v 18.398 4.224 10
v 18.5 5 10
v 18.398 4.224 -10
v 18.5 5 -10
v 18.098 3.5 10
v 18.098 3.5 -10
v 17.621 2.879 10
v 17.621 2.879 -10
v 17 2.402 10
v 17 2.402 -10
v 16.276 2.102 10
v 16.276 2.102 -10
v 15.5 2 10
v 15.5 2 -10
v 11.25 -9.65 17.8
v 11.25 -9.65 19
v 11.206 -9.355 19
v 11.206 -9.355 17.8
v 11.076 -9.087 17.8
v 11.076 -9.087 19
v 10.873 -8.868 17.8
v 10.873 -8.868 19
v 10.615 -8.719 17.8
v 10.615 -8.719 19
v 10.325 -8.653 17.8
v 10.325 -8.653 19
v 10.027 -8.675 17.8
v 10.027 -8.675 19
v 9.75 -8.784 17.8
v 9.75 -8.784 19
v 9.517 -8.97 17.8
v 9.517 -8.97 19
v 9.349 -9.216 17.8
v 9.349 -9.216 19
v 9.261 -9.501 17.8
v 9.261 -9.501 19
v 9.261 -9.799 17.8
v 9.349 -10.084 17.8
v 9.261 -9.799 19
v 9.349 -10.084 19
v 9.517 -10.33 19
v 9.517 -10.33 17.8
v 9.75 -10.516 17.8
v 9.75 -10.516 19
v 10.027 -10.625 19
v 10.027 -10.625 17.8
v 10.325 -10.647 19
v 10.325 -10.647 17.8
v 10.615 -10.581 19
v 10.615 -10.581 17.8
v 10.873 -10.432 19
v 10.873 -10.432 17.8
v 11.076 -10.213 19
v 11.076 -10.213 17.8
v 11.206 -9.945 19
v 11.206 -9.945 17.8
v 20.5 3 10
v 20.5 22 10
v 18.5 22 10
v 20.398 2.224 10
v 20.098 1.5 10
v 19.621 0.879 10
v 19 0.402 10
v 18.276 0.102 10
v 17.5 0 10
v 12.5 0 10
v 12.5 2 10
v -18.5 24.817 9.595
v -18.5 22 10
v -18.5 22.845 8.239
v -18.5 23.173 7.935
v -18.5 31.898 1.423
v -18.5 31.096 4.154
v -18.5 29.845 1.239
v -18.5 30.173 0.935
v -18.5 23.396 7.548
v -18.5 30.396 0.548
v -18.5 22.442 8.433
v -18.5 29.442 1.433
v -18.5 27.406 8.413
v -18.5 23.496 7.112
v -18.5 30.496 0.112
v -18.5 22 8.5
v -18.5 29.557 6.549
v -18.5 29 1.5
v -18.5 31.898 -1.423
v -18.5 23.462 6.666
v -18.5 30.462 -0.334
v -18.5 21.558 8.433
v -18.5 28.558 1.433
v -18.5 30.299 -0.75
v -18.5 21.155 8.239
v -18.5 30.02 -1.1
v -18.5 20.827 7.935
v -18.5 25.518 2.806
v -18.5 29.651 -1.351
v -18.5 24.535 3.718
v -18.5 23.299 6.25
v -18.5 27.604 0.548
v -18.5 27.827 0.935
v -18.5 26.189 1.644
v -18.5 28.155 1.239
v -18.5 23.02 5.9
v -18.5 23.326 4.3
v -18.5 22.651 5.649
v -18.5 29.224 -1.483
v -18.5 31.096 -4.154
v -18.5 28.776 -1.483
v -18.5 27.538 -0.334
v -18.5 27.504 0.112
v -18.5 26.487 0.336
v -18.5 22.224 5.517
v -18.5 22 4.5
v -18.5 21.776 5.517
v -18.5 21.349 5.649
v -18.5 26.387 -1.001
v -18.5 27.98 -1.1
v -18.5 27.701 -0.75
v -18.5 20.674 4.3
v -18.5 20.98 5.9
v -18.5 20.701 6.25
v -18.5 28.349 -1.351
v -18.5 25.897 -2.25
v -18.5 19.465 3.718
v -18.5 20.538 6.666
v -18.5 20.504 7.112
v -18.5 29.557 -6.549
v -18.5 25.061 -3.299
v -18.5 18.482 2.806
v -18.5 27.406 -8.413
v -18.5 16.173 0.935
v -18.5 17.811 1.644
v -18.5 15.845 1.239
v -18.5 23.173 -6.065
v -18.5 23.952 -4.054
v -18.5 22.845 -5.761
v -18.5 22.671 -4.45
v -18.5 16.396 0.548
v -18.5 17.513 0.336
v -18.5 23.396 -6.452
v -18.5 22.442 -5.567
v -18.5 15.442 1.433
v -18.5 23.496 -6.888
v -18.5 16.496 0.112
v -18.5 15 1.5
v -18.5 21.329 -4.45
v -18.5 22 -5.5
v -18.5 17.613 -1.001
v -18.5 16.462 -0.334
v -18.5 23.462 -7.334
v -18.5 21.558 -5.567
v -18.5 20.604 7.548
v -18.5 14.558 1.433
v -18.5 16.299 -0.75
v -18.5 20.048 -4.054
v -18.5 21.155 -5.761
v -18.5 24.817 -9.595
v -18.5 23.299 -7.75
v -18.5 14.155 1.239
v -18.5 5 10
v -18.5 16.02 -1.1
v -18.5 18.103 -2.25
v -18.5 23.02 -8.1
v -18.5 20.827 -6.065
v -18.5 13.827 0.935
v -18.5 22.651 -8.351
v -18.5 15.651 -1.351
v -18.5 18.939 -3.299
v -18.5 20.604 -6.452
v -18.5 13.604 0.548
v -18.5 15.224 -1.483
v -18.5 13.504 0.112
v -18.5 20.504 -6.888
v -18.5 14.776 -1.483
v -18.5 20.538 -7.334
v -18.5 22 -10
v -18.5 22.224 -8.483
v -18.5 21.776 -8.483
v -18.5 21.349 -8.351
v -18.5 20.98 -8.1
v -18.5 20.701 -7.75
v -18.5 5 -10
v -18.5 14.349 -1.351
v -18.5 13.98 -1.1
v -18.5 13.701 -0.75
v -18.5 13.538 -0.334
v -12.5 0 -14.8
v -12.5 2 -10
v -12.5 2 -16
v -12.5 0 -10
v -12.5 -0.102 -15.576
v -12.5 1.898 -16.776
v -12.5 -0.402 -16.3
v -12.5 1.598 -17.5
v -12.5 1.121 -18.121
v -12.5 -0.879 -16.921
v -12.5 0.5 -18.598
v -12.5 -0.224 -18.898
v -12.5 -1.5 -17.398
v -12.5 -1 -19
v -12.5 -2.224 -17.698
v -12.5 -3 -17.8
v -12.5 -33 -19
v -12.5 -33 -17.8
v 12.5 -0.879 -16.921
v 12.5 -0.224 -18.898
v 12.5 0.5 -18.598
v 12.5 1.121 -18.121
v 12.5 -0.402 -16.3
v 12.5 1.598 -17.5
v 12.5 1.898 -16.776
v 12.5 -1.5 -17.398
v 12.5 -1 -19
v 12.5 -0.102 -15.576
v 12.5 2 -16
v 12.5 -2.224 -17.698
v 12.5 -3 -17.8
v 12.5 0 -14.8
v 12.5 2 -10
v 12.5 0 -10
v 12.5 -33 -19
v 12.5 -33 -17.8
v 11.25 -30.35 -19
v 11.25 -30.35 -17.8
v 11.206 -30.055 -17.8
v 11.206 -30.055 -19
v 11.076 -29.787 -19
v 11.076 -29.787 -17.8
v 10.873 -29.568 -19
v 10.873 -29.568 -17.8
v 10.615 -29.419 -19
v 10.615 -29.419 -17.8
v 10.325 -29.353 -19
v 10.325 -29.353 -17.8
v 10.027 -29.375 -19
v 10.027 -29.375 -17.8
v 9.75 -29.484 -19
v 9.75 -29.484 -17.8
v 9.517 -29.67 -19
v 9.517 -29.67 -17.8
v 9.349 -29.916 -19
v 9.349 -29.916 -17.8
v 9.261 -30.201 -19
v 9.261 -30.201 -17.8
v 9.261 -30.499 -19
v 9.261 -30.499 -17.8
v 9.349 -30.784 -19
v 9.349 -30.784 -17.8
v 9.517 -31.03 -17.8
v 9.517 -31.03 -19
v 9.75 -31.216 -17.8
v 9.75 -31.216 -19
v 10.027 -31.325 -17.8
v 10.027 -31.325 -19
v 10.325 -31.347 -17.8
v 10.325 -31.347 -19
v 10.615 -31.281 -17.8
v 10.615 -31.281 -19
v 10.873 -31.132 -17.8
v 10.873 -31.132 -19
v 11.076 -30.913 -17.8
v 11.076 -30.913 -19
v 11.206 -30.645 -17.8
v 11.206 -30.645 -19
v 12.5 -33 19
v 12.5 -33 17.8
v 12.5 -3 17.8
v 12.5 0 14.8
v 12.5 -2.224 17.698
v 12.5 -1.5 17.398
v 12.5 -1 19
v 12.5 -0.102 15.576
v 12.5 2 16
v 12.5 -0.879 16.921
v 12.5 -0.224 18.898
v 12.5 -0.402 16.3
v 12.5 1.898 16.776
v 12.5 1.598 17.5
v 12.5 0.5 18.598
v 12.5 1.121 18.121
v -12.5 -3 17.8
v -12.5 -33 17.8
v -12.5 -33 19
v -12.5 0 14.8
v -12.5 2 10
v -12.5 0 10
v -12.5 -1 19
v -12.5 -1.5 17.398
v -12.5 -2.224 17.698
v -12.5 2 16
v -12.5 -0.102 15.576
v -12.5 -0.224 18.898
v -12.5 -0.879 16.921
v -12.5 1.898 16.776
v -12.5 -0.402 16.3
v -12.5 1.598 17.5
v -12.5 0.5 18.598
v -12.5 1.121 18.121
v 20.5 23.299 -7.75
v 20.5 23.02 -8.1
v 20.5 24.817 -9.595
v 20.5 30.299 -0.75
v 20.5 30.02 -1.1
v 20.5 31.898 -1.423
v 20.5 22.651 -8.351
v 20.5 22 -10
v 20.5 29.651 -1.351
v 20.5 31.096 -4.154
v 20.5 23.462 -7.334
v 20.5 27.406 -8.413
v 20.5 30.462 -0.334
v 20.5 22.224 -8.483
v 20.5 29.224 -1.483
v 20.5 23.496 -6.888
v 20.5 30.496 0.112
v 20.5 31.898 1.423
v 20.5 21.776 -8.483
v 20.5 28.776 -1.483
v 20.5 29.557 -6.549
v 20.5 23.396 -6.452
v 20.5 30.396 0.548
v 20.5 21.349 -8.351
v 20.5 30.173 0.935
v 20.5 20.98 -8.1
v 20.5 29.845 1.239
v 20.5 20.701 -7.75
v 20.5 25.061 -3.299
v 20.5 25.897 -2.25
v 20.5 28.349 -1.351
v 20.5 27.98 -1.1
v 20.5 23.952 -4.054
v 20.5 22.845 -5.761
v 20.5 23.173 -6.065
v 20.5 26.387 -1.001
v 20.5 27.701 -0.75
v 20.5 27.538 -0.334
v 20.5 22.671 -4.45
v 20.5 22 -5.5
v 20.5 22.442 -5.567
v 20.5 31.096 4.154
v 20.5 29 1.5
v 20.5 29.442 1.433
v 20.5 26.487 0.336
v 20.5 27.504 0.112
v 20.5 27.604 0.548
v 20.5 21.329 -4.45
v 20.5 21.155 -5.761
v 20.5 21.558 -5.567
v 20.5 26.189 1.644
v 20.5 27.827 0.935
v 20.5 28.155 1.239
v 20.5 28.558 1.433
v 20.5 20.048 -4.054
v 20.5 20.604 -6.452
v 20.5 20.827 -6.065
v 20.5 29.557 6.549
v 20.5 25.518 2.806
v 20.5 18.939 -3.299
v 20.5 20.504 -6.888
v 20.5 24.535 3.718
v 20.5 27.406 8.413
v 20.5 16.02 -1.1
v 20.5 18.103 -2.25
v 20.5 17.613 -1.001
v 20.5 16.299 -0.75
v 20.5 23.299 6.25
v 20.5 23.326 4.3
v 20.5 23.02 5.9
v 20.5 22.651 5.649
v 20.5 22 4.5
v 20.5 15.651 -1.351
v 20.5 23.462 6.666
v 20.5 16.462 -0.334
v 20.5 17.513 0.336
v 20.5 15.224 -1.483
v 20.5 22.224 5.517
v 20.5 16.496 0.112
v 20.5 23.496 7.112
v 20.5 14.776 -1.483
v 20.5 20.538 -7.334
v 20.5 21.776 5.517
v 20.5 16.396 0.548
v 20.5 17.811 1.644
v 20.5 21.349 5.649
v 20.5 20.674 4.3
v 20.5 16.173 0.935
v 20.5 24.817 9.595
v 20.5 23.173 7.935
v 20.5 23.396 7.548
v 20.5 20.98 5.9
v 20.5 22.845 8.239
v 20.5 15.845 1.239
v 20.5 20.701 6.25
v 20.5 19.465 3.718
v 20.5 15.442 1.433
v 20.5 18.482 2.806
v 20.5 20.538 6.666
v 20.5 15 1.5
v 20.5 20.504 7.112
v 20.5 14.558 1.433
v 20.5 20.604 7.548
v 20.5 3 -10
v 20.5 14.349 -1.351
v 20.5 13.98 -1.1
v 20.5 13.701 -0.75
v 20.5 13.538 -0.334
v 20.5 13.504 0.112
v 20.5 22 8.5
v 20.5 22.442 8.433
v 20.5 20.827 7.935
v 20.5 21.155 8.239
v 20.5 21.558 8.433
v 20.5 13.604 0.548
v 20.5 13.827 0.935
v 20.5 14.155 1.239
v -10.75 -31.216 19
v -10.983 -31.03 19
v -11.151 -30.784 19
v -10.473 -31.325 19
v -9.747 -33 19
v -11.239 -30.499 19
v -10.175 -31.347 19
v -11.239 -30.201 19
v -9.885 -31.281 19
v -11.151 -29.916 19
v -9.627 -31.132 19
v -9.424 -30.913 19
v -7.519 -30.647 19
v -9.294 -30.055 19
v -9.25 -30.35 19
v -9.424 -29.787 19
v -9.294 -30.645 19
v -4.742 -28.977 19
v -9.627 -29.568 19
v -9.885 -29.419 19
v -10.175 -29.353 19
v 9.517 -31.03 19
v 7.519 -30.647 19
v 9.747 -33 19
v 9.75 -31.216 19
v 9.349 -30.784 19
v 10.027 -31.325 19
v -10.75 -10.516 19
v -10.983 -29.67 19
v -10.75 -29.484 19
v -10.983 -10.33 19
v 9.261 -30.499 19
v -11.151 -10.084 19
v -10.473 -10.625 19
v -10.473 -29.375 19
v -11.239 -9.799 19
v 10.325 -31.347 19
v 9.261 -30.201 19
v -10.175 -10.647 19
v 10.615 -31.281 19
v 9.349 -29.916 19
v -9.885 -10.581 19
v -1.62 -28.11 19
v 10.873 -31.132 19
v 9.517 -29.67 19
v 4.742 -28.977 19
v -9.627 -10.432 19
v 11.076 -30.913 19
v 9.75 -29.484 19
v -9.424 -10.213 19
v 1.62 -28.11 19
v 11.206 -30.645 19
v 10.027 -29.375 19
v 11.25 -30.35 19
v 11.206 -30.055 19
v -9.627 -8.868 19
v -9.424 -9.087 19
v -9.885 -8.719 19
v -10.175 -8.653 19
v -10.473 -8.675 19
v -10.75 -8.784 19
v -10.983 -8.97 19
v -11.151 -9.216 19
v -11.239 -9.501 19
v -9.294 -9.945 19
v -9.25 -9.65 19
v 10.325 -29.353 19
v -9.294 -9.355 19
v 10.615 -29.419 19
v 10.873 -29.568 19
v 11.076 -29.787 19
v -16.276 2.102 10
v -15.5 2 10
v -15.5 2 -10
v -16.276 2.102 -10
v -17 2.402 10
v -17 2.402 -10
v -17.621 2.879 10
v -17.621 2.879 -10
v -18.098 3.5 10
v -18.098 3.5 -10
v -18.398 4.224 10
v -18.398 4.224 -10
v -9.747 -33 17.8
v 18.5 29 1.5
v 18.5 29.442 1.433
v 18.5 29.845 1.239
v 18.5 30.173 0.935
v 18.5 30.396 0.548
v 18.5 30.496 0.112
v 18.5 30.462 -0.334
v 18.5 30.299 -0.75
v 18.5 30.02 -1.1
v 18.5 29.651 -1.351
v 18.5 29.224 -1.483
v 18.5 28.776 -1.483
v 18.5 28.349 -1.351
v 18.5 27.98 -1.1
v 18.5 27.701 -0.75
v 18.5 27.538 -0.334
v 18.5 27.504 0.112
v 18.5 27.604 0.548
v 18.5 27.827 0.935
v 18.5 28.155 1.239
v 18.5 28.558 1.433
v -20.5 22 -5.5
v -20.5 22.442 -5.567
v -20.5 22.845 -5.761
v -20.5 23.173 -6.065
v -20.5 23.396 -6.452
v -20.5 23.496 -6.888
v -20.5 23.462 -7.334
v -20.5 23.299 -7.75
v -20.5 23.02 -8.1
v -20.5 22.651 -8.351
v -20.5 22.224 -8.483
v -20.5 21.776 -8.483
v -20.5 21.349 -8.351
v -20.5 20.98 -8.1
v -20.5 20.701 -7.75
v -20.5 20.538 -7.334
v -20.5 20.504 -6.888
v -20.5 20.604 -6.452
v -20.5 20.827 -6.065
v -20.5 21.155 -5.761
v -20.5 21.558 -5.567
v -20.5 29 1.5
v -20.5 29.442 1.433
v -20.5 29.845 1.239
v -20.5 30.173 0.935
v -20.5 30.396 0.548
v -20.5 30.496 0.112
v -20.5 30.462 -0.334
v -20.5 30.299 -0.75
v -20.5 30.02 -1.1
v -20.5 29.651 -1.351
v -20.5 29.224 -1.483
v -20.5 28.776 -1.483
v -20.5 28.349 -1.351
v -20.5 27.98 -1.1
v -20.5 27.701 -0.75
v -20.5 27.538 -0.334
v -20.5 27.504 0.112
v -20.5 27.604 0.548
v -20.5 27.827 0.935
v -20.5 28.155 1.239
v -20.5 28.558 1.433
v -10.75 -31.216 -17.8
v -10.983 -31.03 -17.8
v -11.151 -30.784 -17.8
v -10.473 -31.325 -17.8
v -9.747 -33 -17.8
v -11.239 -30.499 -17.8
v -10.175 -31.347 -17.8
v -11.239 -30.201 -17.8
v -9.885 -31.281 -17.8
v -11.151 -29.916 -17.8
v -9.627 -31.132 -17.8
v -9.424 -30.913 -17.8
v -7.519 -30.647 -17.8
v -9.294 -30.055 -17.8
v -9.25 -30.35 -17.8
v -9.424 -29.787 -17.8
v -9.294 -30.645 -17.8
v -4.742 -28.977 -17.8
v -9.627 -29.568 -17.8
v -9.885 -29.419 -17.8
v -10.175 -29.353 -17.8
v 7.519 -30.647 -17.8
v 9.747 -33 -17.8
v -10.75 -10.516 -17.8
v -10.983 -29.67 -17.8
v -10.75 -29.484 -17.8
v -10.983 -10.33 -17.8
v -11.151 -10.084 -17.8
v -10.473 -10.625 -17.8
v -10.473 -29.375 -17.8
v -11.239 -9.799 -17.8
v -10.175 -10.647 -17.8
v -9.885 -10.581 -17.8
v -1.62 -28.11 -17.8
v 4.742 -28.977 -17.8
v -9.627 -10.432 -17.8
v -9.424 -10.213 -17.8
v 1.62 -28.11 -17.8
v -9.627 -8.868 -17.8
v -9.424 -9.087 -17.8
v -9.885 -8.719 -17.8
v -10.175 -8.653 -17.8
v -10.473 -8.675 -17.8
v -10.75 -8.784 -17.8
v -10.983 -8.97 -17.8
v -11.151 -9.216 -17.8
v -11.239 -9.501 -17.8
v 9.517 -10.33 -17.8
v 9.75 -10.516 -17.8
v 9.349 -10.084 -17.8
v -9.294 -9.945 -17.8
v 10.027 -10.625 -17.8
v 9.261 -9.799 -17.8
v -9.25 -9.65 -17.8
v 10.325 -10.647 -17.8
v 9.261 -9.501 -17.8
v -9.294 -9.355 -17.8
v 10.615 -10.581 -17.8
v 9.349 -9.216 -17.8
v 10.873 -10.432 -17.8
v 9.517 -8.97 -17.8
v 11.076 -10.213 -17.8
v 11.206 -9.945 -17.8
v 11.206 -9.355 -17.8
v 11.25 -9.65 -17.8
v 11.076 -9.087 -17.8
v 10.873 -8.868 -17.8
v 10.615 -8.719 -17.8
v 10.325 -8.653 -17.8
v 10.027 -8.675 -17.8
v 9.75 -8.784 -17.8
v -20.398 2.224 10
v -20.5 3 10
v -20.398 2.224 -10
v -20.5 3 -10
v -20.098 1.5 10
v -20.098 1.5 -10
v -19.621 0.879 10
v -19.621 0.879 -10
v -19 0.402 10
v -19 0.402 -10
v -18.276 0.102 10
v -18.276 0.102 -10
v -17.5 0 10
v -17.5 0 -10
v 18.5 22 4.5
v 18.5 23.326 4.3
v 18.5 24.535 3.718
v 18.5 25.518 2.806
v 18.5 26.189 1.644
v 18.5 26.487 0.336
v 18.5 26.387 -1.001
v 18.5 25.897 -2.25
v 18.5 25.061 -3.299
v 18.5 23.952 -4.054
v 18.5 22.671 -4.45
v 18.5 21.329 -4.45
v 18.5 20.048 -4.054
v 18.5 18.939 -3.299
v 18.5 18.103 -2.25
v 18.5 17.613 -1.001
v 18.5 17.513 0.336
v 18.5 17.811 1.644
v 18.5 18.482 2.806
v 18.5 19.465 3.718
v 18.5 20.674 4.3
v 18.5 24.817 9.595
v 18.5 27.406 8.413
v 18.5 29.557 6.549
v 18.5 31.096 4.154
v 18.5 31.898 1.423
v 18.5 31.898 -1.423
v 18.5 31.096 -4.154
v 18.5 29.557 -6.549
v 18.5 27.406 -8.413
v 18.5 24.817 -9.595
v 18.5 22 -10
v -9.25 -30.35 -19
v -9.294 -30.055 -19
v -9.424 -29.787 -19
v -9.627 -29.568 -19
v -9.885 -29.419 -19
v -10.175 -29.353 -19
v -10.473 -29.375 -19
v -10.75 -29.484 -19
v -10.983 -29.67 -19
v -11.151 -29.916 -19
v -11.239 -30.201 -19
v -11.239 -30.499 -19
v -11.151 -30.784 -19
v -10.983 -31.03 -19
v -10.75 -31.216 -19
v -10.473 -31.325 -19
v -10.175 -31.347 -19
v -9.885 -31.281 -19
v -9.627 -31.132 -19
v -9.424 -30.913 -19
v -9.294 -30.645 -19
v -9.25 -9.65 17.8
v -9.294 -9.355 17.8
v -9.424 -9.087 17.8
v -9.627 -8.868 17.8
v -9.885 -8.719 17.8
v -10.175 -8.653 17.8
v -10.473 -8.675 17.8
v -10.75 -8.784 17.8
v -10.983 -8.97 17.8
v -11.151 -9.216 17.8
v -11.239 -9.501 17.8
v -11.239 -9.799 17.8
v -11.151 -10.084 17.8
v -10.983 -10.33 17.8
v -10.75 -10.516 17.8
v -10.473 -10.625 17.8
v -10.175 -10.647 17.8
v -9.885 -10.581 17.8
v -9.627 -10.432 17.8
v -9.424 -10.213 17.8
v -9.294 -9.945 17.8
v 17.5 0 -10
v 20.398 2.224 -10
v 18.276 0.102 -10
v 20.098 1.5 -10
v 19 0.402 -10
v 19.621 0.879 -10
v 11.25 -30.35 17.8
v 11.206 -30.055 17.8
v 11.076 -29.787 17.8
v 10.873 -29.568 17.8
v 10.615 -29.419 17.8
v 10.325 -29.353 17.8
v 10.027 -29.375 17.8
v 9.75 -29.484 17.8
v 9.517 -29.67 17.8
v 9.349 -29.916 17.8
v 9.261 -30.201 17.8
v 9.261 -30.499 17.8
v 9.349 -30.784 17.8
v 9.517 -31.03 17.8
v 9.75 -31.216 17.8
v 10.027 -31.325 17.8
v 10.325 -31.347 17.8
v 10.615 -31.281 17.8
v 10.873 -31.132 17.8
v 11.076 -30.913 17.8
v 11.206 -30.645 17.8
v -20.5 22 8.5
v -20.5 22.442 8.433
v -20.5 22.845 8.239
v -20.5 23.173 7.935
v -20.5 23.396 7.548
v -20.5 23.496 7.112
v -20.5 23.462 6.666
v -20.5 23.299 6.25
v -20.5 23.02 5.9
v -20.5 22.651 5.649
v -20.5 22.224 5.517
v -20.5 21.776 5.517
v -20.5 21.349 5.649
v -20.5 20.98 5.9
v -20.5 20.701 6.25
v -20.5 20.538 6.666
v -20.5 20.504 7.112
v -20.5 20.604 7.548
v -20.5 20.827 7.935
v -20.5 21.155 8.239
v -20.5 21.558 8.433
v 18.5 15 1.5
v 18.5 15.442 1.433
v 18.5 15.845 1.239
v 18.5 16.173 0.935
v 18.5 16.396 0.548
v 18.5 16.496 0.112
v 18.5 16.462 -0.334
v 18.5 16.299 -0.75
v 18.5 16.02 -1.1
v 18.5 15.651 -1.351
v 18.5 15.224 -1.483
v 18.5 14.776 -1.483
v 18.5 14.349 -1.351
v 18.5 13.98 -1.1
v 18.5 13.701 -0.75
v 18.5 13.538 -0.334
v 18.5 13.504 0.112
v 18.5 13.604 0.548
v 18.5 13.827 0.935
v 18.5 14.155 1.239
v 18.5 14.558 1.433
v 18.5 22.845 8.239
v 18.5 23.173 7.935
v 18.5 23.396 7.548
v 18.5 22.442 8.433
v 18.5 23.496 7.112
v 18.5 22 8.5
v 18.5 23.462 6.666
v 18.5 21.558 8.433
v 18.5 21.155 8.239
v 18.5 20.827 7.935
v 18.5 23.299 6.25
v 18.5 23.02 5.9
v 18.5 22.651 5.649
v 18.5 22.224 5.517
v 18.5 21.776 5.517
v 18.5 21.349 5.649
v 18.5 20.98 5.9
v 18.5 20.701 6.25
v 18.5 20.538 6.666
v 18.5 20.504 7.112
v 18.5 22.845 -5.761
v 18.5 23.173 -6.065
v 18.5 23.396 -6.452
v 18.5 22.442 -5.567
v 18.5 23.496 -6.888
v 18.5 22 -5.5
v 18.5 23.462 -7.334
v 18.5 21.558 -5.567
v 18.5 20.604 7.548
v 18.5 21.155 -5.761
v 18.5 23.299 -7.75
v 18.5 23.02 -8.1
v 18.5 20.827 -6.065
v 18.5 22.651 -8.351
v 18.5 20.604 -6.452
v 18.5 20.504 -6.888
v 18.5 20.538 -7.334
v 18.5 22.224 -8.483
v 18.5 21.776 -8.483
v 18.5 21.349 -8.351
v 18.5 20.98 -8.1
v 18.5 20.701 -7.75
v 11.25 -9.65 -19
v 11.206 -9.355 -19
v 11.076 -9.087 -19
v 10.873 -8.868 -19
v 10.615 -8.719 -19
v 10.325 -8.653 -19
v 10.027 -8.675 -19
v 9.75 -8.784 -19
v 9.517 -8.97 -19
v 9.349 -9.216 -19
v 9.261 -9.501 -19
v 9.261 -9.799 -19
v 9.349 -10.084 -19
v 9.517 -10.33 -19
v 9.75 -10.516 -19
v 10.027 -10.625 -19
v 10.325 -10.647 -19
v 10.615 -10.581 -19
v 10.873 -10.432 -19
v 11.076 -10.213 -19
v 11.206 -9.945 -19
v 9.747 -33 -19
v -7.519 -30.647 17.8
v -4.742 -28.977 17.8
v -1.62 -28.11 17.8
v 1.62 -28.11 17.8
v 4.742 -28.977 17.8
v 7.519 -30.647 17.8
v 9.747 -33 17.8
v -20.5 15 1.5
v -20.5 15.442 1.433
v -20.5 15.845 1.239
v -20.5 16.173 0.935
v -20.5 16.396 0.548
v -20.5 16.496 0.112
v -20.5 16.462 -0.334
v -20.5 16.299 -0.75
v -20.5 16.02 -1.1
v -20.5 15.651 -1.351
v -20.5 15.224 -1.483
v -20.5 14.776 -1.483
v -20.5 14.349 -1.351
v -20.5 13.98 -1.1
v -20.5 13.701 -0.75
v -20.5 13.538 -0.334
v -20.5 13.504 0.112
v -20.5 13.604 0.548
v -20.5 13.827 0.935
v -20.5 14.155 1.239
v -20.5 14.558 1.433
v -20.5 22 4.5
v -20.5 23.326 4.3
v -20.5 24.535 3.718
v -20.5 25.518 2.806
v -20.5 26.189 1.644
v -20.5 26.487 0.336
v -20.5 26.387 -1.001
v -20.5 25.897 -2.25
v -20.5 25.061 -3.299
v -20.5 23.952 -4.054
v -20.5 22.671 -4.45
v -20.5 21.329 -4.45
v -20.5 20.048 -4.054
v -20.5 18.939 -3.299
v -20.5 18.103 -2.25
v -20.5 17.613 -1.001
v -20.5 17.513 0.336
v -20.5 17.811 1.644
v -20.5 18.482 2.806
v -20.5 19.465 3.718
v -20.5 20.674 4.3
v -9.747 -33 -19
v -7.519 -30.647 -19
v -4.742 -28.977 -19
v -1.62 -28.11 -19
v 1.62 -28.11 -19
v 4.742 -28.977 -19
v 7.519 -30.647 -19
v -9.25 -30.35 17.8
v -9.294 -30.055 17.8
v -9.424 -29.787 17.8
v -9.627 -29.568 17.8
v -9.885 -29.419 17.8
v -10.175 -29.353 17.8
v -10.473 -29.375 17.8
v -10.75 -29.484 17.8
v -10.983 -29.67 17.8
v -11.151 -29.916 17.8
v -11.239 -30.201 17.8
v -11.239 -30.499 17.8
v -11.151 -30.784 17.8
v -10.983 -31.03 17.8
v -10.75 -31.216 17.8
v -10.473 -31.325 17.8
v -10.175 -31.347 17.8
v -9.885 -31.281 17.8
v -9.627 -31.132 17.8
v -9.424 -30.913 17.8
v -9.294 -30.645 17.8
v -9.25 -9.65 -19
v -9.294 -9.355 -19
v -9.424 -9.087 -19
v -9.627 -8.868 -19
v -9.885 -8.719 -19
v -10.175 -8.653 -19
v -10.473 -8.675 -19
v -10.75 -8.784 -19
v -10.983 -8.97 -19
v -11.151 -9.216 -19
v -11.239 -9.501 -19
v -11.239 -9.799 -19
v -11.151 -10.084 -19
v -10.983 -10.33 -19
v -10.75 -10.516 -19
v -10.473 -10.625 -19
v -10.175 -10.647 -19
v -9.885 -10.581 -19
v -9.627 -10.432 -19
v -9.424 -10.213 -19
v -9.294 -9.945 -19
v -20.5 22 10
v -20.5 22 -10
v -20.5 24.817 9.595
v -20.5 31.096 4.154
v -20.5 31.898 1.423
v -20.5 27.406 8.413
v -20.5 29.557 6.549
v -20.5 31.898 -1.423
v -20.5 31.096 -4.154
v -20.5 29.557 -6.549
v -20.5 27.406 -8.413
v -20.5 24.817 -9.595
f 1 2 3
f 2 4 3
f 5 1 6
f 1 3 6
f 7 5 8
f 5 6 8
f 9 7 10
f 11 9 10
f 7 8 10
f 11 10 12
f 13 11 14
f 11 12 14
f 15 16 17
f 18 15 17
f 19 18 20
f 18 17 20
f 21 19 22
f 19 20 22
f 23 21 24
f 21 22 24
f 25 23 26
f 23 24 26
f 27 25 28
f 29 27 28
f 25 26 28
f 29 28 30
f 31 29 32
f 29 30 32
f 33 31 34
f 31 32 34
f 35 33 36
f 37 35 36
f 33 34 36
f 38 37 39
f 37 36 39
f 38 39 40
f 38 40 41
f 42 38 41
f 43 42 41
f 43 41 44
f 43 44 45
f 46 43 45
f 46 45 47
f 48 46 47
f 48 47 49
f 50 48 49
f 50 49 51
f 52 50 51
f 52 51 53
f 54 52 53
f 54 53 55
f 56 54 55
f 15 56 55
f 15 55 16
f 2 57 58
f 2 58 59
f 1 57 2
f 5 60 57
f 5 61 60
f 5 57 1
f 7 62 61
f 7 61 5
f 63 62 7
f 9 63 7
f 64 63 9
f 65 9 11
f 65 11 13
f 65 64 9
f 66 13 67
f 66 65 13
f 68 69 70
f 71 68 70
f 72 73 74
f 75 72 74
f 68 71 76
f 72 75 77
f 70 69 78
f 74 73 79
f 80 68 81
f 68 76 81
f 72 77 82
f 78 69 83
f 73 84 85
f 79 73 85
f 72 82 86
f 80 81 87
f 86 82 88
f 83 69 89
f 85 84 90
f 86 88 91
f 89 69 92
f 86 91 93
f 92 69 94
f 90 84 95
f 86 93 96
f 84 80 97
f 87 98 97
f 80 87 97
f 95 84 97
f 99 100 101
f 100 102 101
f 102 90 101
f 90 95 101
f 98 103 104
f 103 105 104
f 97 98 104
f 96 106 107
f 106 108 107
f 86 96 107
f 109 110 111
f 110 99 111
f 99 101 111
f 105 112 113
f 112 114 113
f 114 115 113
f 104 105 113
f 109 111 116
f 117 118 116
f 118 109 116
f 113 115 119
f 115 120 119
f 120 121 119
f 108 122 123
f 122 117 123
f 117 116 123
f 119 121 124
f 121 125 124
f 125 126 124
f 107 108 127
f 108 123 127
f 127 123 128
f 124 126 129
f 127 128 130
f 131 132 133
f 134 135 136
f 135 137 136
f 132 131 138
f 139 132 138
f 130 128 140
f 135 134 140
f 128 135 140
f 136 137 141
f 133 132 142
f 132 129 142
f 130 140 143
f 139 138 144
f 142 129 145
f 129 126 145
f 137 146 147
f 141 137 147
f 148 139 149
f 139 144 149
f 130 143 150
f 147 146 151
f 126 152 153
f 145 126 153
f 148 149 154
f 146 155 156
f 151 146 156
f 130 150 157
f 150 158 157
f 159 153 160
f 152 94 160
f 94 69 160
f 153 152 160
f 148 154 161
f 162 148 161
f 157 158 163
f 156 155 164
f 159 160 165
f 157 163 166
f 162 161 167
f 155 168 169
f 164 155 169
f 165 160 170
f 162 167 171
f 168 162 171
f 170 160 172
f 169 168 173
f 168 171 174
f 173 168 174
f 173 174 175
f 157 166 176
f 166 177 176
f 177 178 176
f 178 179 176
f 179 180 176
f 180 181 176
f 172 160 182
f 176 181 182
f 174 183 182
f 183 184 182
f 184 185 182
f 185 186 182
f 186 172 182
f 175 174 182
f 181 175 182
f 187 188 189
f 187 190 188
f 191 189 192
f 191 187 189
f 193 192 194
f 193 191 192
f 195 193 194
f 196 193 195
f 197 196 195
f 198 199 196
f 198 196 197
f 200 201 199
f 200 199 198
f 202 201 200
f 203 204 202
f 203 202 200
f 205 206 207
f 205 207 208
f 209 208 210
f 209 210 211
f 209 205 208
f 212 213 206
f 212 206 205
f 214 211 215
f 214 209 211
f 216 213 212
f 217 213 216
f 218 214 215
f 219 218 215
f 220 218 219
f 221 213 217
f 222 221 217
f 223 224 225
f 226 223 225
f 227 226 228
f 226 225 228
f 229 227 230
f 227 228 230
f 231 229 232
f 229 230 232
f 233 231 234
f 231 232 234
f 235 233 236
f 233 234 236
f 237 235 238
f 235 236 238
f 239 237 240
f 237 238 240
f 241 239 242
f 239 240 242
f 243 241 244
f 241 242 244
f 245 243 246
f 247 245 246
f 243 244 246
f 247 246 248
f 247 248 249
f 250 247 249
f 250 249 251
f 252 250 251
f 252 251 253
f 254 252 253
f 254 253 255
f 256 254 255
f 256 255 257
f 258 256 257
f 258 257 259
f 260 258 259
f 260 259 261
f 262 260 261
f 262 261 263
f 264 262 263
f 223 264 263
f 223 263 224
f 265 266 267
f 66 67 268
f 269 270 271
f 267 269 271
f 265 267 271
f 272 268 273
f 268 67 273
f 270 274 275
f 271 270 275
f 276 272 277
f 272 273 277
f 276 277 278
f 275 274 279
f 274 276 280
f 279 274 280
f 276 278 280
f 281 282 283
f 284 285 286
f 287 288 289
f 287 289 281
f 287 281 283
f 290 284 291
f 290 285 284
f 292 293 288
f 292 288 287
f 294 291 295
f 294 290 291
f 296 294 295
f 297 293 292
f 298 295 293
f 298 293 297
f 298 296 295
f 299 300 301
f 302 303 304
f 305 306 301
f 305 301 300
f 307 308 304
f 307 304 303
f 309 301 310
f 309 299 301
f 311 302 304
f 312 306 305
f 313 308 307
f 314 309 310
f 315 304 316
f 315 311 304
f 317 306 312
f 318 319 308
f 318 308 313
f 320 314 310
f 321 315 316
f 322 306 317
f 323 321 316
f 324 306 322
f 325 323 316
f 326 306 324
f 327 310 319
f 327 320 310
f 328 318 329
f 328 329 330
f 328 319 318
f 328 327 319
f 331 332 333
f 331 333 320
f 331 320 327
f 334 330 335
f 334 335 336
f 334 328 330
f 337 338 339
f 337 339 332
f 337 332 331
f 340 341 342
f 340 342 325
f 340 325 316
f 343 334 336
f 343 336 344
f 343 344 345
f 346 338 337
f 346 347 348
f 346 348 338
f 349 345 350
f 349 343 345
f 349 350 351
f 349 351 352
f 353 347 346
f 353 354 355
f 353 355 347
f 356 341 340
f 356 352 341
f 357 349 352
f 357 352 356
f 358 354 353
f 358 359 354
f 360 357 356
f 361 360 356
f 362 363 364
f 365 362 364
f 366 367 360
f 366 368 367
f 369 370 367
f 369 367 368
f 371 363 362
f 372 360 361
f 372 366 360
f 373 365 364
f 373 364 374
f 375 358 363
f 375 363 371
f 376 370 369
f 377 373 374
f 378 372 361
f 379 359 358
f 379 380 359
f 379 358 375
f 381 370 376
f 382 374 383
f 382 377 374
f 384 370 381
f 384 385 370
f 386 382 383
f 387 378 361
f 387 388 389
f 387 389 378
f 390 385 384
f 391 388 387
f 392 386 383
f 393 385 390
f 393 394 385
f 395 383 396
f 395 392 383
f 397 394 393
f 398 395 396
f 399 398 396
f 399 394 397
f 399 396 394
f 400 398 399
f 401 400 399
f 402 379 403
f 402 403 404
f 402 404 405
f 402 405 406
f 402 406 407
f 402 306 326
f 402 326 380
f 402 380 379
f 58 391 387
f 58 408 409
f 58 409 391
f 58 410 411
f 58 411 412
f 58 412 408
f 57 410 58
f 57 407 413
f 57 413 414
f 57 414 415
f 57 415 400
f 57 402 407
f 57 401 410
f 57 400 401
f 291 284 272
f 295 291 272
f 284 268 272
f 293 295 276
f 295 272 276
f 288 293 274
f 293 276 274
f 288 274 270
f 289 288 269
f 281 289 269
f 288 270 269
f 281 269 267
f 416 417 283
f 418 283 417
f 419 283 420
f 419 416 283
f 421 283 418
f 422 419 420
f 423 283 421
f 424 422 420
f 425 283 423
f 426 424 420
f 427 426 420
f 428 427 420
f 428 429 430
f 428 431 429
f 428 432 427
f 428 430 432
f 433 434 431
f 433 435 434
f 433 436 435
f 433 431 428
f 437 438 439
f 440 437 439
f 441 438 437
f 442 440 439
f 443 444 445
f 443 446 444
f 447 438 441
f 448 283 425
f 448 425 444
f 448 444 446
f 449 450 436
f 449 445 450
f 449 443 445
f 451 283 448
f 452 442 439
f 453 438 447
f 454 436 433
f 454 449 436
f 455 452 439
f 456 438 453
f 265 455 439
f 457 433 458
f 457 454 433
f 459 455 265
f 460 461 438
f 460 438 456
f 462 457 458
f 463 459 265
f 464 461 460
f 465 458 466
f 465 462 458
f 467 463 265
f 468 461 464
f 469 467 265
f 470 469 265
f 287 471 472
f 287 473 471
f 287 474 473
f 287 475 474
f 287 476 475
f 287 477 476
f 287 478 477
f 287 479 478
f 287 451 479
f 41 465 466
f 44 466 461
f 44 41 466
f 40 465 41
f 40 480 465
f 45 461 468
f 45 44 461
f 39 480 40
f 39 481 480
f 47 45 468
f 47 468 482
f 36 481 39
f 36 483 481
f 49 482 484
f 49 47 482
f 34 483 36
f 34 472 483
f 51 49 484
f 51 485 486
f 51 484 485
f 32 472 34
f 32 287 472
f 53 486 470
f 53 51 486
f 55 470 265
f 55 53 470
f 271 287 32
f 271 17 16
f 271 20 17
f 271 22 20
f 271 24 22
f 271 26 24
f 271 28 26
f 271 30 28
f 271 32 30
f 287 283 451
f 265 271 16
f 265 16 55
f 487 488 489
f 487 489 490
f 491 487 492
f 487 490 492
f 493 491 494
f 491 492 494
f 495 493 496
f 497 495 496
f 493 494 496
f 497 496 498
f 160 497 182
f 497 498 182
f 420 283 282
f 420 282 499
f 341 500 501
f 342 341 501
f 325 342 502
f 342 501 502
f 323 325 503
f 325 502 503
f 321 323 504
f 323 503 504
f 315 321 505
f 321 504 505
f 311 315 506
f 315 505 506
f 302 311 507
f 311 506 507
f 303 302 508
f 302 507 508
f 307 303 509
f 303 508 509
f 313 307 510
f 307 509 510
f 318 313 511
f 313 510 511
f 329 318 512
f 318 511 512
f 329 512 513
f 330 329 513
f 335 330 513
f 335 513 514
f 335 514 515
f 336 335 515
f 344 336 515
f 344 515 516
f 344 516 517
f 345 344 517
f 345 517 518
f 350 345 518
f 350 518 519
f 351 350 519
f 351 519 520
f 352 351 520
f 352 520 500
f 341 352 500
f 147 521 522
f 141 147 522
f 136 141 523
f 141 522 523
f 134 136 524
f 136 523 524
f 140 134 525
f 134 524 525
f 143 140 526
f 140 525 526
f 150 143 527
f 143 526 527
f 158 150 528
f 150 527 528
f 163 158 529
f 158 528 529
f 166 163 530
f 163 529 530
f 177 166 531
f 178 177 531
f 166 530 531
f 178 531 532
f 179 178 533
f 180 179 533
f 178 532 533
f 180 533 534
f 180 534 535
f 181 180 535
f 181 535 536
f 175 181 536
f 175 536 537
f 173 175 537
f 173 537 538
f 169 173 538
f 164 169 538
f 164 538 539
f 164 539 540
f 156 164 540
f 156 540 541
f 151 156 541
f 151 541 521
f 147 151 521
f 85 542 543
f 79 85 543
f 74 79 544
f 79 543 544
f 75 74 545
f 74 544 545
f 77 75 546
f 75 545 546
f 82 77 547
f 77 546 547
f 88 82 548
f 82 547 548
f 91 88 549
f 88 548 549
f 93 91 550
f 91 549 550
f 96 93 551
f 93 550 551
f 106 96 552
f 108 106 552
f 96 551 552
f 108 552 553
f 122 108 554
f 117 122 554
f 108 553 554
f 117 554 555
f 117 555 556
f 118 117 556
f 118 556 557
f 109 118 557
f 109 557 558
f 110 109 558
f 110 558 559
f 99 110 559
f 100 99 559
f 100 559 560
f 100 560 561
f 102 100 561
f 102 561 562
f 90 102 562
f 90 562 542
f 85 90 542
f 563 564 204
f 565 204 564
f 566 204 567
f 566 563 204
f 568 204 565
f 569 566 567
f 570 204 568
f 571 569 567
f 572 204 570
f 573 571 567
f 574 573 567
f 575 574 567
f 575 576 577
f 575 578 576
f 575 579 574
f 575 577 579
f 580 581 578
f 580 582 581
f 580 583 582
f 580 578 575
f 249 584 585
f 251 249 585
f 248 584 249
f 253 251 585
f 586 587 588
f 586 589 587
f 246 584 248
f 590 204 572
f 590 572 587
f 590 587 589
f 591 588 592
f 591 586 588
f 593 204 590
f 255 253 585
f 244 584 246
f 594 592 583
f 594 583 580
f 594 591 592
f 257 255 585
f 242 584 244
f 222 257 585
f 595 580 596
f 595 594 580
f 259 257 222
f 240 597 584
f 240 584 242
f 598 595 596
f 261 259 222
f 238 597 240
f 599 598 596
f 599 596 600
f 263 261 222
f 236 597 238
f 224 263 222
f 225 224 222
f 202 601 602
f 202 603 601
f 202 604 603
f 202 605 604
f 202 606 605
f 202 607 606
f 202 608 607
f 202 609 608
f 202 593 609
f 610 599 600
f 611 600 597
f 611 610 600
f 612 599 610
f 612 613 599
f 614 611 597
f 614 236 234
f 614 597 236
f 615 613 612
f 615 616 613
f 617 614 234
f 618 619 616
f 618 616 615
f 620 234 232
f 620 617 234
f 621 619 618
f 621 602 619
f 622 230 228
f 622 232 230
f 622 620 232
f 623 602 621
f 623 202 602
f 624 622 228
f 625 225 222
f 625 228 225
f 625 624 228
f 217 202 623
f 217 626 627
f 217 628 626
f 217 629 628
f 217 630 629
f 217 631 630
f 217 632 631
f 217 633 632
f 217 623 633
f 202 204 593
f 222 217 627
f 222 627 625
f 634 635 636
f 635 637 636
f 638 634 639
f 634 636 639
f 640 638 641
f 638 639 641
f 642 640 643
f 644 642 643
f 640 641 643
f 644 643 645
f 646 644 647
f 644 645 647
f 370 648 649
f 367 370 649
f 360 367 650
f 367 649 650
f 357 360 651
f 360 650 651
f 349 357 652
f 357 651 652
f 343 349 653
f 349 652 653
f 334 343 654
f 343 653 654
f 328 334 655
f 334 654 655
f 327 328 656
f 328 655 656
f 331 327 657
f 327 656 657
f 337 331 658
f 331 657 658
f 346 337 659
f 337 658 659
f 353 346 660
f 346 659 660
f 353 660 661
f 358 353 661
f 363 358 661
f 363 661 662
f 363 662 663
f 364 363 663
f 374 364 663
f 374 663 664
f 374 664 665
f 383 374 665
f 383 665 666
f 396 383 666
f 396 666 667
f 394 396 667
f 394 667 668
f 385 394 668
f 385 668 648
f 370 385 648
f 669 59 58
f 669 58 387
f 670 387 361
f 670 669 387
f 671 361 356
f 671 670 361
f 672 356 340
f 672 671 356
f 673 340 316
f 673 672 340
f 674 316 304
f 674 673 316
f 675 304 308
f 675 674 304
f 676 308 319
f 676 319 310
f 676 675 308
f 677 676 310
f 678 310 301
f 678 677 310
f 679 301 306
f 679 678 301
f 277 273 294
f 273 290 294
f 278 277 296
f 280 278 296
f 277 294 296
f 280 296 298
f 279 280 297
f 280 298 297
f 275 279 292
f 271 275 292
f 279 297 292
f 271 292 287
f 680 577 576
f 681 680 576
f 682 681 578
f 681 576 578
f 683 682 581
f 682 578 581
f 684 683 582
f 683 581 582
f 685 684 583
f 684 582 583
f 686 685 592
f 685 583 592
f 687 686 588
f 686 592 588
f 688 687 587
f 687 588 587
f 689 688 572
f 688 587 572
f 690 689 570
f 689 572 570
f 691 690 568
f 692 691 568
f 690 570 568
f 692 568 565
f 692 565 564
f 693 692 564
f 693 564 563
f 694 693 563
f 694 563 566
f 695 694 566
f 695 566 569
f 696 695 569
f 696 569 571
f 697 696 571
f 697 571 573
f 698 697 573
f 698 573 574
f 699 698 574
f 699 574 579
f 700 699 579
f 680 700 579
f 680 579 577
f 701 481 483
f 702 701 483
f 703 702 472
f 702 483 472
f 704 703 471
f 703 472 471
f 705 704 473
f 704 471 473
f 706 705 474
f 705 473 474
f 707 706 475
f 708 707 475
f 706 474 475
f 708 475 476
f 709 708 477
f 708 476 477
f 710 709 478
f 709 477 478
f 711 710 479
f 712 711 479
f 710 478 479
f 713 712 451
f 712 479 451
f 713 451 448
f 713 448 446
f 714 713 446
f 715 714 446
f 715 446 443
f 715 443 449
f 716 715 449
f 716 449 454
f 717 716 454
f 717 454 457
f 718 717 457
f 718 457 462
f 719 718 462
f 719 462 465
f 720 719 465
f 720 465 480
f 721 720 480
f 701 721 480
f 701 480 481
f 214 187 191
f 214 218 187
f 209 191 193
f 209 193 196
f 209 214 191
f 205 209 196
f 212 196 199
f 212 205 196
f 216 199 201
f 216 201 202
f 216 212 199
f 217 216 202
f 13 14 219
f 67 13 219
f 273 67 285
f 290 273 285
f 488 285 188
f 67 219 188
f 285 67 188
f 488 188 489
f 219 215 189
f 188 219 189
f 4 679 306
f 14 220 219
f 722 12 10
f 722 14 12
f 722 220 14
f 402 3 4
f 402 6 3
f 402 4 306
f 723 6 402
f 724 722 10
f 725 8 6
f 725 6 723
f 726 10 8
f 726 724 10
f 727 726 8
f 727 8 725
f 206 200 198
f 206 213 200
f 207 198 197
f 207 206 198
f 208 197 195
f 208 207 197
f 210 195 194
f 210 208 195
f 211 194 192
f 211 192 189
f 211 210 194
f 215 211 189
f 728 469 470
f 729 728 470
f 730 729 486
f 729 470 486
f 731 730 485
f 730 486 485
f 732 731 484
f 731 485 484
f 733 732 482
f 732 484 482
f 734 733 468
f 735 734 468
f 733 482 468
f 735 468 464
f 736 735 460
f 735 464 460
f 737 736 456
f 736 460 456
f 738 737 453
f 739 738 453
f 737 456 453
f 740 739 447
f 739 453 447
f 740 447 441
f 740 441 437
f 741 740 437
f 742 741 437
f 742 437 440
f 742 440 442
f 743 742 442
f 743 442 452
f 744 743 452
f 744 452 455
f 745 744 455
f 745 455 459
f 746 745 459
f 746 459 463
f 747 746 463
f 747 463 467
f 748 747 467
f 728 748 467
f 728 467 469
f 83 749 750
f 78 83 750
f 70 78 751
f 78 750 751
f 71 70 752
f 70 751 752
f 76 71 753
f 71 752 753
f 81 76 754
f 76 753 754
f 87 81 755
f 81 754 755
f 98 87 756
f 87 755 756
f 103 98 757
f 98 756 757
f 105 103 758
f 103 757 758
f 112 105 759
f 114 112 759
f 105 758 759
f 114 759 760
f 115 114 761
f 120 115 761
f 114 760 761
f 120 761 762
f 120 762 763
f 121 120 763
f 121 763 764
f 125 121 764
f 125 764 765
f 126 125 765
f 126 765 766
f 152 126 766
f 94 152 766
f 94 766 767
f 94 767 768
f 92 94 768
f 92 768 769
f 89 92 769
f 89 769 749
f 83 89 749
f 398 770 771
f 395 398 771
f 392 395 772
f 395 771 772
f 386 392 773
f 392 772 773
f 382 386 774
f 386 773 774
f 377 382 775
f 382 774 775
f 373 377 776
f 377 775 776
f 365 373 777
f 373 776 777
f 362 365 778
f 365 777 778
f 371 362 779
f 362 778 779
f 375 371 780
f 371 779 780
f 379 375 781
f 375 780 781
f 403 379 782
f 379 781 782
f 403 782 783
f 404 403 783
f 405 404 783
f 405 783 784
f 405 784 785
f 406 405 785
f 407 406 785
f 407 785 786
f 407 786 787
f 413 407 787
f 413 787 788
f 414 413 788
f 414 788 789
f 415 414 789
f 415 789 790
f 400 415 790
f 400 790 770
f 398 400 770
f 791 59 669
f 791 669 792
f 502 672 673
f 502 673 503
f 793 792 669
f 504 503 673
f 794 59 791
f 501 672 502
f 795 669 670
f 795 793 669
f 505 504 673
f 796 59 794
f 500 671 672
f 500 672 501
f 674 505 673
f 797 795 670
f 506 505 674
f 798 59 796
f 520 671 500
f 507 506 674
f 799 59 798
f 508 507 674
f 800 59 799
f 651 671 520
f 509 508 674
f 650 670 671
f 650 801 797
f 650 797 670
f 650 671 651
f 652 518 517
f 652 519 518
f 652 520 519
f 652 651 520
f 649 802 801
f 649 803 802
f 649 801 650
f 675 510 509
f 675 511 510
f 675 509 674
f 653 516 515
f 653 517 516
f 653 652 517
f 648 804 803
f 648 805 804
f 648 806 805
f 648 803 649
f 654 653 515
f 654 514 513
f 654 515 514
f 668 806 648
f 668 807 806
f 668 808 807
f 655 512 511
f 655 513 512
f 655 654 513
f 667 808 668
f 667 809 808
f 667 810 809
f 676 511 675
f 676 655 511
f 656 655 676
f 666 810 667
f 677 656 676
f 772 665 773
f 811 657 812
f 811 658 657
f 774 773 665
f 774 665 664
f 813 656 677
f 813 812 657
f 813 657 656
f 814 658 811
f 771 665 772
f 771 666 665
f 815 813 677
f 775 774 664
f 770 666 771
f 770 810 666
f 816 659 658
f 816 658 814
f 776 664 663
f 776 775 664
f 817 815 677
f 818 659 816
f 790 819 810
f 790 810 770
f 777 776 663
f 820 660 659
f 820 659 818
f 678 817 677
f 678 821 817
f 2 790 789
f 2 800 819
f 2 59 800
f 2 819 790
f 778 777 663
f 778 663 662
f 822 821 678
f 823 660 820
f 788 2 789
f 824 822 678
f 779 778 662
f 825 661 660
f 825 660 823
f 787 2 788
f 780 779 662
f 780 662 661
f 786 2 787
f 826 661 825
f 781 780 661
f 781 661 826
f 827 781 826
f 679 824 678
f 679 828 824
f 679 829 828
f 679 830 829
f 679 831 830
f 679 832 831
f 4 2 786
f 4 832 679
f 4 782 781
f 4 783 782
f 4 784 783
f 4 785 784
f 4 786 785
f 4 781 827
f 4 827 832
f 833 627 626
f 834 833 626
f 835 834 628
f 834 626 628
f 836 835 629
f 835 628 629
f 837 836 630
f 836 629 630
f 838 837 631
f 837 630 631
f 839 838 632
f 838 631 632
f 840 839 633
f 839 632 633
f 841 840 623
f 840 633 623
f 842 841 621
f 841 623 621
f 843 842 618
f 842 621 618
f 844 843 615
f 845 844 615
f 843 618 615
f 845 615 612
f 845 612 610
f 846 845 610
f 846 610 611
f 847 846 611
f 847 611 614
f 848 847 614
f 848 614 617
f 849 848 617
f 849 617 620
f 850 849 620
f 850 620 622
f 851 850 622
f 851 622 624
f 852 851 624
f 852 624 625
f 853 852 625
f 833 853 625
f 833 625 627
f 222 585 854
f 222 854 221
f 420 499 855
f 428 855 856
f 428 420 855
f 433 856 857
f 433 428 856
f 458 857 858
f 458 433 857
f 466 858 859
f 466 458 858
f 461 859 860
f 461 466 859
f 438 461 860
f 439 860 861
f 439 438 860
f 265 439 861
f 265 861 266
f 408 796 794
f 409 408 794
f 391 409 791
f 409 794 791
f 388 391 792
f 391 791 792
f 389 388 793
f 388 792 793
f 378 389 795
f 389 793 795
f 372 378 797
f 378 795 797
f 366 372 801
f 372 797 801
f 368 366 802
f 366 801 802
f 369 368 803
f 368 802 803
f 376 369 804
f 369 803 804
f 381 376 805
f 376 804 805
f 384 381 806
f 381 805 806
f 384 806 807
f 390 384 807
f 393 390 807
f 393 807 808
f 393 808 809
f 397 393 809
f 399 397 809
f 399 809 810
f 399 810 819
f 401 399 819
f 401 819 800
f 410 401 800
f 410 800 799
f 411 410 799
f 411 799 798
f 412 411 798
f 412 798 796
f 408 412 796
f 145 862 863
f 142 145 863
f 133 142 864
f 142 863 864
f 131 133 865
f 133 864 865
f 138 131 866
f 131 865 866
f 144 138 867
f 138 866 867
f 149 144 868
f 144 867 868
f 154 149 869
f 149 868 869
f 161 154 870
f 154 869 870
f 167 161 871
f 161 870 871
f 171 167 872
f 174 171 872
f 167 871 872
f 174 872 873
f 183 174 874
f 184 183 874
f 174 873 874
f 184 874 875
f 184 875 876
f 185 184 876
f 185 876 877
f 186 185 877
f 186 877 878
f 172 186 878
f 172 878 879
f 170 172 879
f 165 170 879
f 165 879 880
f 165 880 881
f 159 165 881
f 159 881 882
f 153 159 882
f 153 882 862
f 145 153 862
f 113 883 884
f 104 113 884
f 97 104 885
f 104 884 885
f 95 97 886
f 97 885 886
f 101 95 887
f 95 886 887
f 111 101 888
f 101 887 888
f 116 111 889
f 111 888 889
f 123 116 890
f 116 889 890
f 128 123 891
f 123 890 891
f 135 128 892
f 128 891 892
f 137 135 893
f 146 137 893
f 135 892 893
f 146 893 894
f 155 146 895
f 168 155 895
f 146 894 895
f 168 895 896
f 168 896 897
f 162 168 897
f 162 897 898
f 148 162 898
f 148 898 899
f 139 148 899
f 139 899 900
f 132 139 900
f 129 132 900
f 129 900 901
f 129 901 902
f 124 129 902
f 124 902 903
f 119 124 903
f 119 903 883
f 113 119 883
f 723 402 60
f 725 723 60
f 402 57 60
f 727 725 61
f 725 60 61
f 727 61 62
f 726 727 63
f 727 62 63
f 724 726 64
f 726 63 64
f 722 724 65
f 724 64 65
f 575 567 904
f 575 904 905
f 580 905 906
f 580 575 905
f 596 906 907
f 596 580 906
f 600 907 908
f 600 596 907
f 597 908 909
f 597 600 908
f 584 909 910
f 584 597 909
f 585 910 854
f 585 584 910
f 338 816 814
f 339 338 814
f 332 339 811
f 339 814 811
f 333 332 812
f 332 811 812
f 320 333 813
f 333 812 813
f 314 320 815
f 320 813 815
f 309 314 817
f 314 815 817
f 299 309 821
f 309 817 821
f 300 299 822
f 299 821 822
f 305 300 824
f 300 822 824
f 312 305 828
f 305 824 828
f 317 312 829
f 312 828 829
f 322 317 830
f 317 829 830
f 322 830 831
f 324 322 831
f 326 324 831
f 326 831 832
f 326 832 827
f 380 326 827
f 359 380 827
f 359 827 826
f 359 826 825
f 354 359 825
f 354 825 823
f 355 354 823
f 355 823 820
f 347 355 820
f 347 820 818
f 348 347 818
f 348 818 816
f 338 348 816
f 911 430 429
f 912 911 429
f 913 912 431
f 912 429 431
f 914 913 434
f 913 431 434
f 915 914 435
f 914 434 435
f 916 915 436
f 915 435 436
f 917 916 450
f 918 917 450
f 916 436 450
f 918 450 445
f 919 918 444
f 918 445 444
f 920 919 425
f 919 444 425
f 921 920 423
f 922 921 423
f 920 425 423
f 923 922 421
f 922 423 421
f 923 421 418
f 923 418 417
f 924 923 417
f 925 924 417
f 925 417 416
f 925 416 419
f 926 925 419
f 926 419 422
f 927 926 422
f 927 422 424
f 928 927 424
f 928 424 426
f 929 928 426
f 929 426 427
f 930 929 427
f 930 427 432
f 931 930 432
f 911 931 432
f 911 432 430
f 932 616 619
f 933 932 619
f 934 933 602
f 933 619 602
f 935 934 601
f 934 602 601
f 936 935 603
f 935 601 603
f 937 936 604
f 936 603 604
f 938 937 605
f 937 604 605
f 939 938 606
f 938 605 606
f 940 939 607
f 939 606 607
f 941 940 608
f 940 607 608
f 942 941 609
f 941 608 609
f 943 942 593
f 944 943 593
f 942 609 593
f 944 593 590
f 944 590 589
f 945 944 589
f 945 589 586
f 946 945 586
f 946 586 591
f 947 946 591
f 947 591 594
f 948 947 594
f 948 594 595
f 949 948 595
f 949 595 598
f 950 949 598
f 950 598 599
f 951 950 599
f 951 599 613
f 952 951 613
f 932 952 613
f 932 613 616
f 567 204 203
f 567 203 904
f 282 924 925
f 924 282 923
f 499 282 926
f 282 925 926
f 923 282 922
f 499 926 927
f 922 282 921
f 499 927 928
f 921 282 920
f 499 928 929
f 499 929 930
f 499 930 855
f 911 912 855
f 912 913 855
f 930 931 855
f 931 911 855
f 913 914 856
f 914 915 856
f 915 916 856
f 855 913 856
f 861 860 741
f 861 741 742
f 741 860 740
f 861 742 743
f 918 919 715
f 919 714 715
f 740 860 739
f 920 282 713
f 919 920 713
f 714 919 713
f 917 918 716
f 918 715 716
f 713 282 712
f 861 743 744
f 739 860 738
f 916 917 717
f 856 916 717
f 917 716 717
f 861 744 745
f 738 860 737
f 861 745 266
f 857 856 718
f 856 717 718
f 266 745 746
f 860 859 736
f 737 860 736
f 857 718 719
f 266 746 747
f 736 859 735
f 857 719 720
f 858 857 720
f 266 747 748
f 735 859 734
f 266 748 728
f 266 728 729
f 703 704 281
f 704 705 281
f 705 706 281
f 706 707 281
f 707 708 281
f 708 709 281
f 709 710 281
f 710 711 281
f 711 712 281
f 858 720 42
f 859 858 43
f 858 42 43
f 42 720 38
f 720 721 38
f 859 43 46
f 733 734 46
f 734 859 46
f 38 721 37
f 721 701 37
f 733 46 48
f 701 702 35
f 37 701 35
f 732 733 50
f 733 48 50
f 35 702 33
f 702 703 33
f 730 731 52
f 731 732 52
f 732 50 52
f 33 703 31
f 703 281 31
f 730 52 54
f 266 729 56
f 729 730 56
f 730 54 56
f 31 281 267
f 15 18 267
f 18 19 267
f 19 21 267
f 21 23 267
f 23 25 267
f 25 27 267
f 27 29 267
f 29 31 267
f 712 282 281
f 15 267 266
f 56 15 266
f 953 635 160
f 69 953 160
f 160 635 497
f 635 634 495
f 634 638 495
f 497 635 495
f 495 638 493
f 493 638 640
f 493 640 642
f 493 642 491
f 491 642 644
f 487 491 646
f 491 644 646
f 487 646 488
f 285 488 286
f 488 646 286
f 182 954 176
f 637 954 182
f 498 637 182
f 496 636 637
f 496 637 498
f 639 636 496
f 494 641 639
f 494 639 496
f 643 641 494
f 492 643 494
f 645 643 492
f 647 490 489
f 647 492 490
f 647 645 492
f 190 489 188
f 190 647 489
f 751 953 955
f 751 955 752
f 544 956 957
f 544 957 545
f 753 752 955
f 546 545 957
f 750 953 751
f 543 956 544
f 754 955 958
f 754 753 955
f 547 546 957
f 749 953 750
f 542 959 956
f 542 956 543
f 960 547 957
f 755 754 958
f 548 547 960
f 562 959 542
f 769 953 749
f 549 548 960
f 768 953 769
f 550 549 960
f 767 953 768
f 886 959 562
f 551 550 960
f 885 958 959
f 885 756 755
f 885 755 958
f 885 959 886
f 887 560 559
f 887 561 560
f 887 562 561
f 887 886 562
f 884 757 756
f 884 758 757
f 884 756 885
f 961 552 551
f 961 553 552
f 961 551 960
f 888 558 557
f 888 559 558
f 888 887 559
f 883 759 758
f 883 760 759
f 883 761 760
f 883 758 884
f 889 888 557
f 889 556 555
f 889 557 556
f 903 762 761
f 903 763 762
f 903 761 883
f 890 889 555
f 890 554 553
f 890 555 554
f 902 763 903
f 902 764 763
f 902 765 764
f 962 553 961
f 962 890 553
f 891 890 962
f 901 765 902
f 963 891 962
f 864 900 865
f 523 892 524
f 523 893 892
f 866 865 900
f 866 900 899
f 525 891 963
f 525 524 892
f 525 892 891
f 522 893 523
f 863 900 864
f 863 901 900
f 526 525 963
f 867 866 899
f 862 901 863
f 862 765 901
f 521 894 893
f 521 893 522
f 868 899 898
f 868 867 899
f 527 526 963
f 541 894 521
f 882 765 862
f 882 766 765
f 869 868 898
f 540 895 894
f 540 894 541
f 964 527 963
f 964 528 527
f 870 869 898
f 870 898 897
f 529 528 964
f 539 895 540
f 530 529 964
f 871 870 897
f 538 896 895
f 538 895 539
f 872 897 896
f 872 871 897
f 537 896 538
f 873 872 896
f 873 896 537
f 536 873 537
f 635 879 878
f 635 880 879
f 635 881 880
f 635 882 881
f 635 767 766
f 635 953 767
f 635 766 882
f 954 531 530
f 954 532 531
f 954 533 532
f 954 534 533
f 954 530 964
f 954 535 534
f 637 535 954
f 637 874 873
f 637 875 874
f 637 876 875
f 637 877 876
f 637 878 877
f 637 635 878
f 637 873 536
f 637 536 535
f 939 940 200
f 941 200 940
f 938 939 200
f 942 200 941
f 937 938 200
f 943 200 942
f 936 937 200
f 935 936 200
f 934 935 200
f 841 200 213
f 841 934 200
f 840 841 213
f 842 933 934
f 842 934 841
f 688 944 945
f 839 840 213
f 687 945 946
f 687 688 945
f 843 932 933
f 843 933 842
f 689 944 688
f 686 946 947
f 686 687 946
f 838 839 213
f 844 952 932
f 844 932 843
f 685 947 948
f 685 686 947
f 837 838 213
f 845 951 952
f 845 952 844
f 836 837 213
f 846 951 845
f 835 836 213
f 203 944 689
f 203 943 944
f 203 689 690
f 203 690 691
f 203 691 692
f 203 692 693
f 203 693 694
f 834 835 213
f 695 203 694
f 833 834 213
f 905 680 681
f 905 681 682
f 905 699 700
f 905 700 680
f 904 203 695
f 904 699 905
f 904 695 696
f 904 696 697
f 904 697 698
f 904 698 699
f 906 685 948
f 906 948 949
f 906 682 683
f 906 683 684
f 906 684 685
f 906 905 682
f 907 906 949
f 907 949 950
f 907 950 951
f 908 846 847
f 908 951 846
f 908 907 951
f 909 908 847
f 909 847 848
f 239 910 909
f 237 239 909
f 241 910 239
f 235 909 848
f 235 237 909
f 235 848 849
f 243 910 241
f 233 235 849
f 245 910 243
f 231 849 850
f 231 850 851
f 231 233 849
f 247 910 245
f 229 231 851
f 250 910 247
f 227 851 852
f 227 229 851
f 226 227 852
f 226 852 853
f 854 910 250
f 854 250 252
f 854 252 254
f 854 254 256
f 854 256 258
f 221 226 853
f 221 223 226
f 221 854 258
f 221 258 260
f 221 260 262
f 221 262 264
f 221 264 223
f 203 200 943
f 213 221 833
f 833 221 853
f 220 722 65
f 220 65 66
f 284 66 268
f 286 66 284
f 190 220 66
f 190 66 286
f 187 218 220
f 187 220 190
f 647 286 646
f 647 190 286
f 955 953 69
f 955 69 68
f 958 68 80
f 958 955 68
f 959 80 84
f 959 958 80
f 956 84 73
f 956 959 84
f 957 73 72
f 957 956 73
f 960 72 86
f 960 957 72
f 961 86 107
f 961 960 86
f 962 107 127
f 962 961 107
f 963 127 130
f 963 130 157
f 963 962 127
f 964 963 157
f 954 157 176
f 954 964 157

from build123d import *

# Parameters (mm, degrees)
EXTRUDE_1_DEPTH     = 2
SKETCH_2_W          = 2
SKETCH_2_H          = 20
EXTRUDE_2_DEPTH     = 40
FILLET_1_R          = 3
SKETCH_4_W          = 25
SKETCH_4_H          = 1.2
EXTRUDE_3_DEPTH     = 40
FILLET_2_R          = 3
SKETCH_6_R          = 4.5
SKETCH_6_R_2        = 1.5
CUT_EXTRUDE_2_DEPTH = 62.692787261
SKETCH_7_R          = 1
CUT_EXTRUDE_3_DEPTH = 59.857879676


with BuildPart() as part:
    # 草图1 → 凸台-拉伸1 (new body)
    with BuildSketch(Plane(origin=(0, 0, 0), x_dir=(1, 0, 0), z_dir=(0, 1, 0))):
        Polygon((12.5, -10), (12.5, -19), (-12.5, -19), (-12.5, -10), (-20.5, -10), (-20.5, 10), (-12.5, 10), (-12.5, 19), (12.5, 19), (12.5, 10), (20.5, 10), (20.5, -10), align=None)
    extrude(amount=EXTRUDE_1_DEPTH)

    # 草图2 → 凸台-拉伸2 (add)
    with BuildSketch(Plane(origin=(0, 2, 0), x_dir=(1, 0, 0), z_dir=(0, 1, 0))):
        with Locations((-19.5, 0)):
            Rectangle(SKETCH_2_W, SKETCH_2_H)
        with Locations((19.5, 0)):
            Rectangle(SKETCH_2_W, SKETCH_2_H)
    extrude(amount=EXTRUDE_2_DEPTH)

    # 圆角1
    fillet_1_edges = [part.edges().sort_by_distance(p)[0] for p in [
        (-20.5, 0, 0),
        (20.5, 0, 0),
        (-18.5, 2, 0),
        (18.5, 2, 0),
    ]]
    fillet(fillet_1_edges, radius=FILLET_1_R)

    # 草图4 → 凸台-拉伸3 (add)
    with BuildSketch(Plane.XZ):
        with Locations((0, 18.4)):
            Rectangle(SKETCH_4_W, SKETCH_4_H)
        with Locations((0, -18.4)):
            Rectangle(SKETCH_4_W, SKETCH_4_H)
    extrude(amount=EXTRUDE_3_DEPTH)

    # 圆角2
    fillet_2_edges = [part.edges().sort_by_distance(p)[0] for p in [
        (0, 2, -19),
        (0, 2, 19),
        (0, 0, 17.8),
        (0, 0, -17.8),
    ]]
    fillet(fillet_2_edges, radius=FILLET_2_R)

    # 草图6 → 切除-拉伸2 (cut, through all)
    with BuildSketch(Plane.ZY.offset(20.5)):
        with Locations((0, 22)):
            Circle(SKETCH_6_R)
        with Locations((0, 15)):
            Circle(SKETCH_6_R_2)
        with Locations((-7, 22)):
            Circle(SKETCH_6_R_2)
        with Locations((0, 29)):
            Circle(SKETCH_6_R_2)
        with Locations((7, 22)):
            Circle(SKETCH_6_R_2)
        with BuildLine():
            Line((-10, 22), (-10, 42))
            Line((-10, 42), (10, 42))
            Line((10, 42), (10, 22))
            ThreePointArc((10, 22), (0, 32), (-10, 22))
        make_face()
    extrude(amount=-CUT_EXTRUDE_2_DEPTH, mode=Mode.SUBTRACT)

    # 草图7 → 切除-拉伸3 (cut, through all)
    with BuildSketch(Plane.XY.offset(19)):
        with Locations((-10.25, -30.35)):
            Circle(SKETCH_7_R)
        with Locations((-10.25, -9.65)):
            Circle(SKETCH_7_R)
        with Locations((10.25, -9.65)):
            Circle(SKETCH_7_R)
        with Locations((10.25, -30.35)):
            Circle(SKETCH_7_R)
        with BuildLine():
            Line((-12.5, -33), (-9.746794345, -33))
            ThreePointArc((-9.746794345, -33), (0, -28), (9.746794345, -33))
            Line((9.746794345, -33), (12.5, -33))
            Line((12.5, -33), (12.5, -40))
            Line((12.5, -40), (-12.5, -40))
            Line((-12.5, -40), (-12.5, -33))
        make_face()
    extrude(amount=-CUT_EXTRUDE_3_DEPTH, mode=Mode.SUBTRACT)


solid = part.part
